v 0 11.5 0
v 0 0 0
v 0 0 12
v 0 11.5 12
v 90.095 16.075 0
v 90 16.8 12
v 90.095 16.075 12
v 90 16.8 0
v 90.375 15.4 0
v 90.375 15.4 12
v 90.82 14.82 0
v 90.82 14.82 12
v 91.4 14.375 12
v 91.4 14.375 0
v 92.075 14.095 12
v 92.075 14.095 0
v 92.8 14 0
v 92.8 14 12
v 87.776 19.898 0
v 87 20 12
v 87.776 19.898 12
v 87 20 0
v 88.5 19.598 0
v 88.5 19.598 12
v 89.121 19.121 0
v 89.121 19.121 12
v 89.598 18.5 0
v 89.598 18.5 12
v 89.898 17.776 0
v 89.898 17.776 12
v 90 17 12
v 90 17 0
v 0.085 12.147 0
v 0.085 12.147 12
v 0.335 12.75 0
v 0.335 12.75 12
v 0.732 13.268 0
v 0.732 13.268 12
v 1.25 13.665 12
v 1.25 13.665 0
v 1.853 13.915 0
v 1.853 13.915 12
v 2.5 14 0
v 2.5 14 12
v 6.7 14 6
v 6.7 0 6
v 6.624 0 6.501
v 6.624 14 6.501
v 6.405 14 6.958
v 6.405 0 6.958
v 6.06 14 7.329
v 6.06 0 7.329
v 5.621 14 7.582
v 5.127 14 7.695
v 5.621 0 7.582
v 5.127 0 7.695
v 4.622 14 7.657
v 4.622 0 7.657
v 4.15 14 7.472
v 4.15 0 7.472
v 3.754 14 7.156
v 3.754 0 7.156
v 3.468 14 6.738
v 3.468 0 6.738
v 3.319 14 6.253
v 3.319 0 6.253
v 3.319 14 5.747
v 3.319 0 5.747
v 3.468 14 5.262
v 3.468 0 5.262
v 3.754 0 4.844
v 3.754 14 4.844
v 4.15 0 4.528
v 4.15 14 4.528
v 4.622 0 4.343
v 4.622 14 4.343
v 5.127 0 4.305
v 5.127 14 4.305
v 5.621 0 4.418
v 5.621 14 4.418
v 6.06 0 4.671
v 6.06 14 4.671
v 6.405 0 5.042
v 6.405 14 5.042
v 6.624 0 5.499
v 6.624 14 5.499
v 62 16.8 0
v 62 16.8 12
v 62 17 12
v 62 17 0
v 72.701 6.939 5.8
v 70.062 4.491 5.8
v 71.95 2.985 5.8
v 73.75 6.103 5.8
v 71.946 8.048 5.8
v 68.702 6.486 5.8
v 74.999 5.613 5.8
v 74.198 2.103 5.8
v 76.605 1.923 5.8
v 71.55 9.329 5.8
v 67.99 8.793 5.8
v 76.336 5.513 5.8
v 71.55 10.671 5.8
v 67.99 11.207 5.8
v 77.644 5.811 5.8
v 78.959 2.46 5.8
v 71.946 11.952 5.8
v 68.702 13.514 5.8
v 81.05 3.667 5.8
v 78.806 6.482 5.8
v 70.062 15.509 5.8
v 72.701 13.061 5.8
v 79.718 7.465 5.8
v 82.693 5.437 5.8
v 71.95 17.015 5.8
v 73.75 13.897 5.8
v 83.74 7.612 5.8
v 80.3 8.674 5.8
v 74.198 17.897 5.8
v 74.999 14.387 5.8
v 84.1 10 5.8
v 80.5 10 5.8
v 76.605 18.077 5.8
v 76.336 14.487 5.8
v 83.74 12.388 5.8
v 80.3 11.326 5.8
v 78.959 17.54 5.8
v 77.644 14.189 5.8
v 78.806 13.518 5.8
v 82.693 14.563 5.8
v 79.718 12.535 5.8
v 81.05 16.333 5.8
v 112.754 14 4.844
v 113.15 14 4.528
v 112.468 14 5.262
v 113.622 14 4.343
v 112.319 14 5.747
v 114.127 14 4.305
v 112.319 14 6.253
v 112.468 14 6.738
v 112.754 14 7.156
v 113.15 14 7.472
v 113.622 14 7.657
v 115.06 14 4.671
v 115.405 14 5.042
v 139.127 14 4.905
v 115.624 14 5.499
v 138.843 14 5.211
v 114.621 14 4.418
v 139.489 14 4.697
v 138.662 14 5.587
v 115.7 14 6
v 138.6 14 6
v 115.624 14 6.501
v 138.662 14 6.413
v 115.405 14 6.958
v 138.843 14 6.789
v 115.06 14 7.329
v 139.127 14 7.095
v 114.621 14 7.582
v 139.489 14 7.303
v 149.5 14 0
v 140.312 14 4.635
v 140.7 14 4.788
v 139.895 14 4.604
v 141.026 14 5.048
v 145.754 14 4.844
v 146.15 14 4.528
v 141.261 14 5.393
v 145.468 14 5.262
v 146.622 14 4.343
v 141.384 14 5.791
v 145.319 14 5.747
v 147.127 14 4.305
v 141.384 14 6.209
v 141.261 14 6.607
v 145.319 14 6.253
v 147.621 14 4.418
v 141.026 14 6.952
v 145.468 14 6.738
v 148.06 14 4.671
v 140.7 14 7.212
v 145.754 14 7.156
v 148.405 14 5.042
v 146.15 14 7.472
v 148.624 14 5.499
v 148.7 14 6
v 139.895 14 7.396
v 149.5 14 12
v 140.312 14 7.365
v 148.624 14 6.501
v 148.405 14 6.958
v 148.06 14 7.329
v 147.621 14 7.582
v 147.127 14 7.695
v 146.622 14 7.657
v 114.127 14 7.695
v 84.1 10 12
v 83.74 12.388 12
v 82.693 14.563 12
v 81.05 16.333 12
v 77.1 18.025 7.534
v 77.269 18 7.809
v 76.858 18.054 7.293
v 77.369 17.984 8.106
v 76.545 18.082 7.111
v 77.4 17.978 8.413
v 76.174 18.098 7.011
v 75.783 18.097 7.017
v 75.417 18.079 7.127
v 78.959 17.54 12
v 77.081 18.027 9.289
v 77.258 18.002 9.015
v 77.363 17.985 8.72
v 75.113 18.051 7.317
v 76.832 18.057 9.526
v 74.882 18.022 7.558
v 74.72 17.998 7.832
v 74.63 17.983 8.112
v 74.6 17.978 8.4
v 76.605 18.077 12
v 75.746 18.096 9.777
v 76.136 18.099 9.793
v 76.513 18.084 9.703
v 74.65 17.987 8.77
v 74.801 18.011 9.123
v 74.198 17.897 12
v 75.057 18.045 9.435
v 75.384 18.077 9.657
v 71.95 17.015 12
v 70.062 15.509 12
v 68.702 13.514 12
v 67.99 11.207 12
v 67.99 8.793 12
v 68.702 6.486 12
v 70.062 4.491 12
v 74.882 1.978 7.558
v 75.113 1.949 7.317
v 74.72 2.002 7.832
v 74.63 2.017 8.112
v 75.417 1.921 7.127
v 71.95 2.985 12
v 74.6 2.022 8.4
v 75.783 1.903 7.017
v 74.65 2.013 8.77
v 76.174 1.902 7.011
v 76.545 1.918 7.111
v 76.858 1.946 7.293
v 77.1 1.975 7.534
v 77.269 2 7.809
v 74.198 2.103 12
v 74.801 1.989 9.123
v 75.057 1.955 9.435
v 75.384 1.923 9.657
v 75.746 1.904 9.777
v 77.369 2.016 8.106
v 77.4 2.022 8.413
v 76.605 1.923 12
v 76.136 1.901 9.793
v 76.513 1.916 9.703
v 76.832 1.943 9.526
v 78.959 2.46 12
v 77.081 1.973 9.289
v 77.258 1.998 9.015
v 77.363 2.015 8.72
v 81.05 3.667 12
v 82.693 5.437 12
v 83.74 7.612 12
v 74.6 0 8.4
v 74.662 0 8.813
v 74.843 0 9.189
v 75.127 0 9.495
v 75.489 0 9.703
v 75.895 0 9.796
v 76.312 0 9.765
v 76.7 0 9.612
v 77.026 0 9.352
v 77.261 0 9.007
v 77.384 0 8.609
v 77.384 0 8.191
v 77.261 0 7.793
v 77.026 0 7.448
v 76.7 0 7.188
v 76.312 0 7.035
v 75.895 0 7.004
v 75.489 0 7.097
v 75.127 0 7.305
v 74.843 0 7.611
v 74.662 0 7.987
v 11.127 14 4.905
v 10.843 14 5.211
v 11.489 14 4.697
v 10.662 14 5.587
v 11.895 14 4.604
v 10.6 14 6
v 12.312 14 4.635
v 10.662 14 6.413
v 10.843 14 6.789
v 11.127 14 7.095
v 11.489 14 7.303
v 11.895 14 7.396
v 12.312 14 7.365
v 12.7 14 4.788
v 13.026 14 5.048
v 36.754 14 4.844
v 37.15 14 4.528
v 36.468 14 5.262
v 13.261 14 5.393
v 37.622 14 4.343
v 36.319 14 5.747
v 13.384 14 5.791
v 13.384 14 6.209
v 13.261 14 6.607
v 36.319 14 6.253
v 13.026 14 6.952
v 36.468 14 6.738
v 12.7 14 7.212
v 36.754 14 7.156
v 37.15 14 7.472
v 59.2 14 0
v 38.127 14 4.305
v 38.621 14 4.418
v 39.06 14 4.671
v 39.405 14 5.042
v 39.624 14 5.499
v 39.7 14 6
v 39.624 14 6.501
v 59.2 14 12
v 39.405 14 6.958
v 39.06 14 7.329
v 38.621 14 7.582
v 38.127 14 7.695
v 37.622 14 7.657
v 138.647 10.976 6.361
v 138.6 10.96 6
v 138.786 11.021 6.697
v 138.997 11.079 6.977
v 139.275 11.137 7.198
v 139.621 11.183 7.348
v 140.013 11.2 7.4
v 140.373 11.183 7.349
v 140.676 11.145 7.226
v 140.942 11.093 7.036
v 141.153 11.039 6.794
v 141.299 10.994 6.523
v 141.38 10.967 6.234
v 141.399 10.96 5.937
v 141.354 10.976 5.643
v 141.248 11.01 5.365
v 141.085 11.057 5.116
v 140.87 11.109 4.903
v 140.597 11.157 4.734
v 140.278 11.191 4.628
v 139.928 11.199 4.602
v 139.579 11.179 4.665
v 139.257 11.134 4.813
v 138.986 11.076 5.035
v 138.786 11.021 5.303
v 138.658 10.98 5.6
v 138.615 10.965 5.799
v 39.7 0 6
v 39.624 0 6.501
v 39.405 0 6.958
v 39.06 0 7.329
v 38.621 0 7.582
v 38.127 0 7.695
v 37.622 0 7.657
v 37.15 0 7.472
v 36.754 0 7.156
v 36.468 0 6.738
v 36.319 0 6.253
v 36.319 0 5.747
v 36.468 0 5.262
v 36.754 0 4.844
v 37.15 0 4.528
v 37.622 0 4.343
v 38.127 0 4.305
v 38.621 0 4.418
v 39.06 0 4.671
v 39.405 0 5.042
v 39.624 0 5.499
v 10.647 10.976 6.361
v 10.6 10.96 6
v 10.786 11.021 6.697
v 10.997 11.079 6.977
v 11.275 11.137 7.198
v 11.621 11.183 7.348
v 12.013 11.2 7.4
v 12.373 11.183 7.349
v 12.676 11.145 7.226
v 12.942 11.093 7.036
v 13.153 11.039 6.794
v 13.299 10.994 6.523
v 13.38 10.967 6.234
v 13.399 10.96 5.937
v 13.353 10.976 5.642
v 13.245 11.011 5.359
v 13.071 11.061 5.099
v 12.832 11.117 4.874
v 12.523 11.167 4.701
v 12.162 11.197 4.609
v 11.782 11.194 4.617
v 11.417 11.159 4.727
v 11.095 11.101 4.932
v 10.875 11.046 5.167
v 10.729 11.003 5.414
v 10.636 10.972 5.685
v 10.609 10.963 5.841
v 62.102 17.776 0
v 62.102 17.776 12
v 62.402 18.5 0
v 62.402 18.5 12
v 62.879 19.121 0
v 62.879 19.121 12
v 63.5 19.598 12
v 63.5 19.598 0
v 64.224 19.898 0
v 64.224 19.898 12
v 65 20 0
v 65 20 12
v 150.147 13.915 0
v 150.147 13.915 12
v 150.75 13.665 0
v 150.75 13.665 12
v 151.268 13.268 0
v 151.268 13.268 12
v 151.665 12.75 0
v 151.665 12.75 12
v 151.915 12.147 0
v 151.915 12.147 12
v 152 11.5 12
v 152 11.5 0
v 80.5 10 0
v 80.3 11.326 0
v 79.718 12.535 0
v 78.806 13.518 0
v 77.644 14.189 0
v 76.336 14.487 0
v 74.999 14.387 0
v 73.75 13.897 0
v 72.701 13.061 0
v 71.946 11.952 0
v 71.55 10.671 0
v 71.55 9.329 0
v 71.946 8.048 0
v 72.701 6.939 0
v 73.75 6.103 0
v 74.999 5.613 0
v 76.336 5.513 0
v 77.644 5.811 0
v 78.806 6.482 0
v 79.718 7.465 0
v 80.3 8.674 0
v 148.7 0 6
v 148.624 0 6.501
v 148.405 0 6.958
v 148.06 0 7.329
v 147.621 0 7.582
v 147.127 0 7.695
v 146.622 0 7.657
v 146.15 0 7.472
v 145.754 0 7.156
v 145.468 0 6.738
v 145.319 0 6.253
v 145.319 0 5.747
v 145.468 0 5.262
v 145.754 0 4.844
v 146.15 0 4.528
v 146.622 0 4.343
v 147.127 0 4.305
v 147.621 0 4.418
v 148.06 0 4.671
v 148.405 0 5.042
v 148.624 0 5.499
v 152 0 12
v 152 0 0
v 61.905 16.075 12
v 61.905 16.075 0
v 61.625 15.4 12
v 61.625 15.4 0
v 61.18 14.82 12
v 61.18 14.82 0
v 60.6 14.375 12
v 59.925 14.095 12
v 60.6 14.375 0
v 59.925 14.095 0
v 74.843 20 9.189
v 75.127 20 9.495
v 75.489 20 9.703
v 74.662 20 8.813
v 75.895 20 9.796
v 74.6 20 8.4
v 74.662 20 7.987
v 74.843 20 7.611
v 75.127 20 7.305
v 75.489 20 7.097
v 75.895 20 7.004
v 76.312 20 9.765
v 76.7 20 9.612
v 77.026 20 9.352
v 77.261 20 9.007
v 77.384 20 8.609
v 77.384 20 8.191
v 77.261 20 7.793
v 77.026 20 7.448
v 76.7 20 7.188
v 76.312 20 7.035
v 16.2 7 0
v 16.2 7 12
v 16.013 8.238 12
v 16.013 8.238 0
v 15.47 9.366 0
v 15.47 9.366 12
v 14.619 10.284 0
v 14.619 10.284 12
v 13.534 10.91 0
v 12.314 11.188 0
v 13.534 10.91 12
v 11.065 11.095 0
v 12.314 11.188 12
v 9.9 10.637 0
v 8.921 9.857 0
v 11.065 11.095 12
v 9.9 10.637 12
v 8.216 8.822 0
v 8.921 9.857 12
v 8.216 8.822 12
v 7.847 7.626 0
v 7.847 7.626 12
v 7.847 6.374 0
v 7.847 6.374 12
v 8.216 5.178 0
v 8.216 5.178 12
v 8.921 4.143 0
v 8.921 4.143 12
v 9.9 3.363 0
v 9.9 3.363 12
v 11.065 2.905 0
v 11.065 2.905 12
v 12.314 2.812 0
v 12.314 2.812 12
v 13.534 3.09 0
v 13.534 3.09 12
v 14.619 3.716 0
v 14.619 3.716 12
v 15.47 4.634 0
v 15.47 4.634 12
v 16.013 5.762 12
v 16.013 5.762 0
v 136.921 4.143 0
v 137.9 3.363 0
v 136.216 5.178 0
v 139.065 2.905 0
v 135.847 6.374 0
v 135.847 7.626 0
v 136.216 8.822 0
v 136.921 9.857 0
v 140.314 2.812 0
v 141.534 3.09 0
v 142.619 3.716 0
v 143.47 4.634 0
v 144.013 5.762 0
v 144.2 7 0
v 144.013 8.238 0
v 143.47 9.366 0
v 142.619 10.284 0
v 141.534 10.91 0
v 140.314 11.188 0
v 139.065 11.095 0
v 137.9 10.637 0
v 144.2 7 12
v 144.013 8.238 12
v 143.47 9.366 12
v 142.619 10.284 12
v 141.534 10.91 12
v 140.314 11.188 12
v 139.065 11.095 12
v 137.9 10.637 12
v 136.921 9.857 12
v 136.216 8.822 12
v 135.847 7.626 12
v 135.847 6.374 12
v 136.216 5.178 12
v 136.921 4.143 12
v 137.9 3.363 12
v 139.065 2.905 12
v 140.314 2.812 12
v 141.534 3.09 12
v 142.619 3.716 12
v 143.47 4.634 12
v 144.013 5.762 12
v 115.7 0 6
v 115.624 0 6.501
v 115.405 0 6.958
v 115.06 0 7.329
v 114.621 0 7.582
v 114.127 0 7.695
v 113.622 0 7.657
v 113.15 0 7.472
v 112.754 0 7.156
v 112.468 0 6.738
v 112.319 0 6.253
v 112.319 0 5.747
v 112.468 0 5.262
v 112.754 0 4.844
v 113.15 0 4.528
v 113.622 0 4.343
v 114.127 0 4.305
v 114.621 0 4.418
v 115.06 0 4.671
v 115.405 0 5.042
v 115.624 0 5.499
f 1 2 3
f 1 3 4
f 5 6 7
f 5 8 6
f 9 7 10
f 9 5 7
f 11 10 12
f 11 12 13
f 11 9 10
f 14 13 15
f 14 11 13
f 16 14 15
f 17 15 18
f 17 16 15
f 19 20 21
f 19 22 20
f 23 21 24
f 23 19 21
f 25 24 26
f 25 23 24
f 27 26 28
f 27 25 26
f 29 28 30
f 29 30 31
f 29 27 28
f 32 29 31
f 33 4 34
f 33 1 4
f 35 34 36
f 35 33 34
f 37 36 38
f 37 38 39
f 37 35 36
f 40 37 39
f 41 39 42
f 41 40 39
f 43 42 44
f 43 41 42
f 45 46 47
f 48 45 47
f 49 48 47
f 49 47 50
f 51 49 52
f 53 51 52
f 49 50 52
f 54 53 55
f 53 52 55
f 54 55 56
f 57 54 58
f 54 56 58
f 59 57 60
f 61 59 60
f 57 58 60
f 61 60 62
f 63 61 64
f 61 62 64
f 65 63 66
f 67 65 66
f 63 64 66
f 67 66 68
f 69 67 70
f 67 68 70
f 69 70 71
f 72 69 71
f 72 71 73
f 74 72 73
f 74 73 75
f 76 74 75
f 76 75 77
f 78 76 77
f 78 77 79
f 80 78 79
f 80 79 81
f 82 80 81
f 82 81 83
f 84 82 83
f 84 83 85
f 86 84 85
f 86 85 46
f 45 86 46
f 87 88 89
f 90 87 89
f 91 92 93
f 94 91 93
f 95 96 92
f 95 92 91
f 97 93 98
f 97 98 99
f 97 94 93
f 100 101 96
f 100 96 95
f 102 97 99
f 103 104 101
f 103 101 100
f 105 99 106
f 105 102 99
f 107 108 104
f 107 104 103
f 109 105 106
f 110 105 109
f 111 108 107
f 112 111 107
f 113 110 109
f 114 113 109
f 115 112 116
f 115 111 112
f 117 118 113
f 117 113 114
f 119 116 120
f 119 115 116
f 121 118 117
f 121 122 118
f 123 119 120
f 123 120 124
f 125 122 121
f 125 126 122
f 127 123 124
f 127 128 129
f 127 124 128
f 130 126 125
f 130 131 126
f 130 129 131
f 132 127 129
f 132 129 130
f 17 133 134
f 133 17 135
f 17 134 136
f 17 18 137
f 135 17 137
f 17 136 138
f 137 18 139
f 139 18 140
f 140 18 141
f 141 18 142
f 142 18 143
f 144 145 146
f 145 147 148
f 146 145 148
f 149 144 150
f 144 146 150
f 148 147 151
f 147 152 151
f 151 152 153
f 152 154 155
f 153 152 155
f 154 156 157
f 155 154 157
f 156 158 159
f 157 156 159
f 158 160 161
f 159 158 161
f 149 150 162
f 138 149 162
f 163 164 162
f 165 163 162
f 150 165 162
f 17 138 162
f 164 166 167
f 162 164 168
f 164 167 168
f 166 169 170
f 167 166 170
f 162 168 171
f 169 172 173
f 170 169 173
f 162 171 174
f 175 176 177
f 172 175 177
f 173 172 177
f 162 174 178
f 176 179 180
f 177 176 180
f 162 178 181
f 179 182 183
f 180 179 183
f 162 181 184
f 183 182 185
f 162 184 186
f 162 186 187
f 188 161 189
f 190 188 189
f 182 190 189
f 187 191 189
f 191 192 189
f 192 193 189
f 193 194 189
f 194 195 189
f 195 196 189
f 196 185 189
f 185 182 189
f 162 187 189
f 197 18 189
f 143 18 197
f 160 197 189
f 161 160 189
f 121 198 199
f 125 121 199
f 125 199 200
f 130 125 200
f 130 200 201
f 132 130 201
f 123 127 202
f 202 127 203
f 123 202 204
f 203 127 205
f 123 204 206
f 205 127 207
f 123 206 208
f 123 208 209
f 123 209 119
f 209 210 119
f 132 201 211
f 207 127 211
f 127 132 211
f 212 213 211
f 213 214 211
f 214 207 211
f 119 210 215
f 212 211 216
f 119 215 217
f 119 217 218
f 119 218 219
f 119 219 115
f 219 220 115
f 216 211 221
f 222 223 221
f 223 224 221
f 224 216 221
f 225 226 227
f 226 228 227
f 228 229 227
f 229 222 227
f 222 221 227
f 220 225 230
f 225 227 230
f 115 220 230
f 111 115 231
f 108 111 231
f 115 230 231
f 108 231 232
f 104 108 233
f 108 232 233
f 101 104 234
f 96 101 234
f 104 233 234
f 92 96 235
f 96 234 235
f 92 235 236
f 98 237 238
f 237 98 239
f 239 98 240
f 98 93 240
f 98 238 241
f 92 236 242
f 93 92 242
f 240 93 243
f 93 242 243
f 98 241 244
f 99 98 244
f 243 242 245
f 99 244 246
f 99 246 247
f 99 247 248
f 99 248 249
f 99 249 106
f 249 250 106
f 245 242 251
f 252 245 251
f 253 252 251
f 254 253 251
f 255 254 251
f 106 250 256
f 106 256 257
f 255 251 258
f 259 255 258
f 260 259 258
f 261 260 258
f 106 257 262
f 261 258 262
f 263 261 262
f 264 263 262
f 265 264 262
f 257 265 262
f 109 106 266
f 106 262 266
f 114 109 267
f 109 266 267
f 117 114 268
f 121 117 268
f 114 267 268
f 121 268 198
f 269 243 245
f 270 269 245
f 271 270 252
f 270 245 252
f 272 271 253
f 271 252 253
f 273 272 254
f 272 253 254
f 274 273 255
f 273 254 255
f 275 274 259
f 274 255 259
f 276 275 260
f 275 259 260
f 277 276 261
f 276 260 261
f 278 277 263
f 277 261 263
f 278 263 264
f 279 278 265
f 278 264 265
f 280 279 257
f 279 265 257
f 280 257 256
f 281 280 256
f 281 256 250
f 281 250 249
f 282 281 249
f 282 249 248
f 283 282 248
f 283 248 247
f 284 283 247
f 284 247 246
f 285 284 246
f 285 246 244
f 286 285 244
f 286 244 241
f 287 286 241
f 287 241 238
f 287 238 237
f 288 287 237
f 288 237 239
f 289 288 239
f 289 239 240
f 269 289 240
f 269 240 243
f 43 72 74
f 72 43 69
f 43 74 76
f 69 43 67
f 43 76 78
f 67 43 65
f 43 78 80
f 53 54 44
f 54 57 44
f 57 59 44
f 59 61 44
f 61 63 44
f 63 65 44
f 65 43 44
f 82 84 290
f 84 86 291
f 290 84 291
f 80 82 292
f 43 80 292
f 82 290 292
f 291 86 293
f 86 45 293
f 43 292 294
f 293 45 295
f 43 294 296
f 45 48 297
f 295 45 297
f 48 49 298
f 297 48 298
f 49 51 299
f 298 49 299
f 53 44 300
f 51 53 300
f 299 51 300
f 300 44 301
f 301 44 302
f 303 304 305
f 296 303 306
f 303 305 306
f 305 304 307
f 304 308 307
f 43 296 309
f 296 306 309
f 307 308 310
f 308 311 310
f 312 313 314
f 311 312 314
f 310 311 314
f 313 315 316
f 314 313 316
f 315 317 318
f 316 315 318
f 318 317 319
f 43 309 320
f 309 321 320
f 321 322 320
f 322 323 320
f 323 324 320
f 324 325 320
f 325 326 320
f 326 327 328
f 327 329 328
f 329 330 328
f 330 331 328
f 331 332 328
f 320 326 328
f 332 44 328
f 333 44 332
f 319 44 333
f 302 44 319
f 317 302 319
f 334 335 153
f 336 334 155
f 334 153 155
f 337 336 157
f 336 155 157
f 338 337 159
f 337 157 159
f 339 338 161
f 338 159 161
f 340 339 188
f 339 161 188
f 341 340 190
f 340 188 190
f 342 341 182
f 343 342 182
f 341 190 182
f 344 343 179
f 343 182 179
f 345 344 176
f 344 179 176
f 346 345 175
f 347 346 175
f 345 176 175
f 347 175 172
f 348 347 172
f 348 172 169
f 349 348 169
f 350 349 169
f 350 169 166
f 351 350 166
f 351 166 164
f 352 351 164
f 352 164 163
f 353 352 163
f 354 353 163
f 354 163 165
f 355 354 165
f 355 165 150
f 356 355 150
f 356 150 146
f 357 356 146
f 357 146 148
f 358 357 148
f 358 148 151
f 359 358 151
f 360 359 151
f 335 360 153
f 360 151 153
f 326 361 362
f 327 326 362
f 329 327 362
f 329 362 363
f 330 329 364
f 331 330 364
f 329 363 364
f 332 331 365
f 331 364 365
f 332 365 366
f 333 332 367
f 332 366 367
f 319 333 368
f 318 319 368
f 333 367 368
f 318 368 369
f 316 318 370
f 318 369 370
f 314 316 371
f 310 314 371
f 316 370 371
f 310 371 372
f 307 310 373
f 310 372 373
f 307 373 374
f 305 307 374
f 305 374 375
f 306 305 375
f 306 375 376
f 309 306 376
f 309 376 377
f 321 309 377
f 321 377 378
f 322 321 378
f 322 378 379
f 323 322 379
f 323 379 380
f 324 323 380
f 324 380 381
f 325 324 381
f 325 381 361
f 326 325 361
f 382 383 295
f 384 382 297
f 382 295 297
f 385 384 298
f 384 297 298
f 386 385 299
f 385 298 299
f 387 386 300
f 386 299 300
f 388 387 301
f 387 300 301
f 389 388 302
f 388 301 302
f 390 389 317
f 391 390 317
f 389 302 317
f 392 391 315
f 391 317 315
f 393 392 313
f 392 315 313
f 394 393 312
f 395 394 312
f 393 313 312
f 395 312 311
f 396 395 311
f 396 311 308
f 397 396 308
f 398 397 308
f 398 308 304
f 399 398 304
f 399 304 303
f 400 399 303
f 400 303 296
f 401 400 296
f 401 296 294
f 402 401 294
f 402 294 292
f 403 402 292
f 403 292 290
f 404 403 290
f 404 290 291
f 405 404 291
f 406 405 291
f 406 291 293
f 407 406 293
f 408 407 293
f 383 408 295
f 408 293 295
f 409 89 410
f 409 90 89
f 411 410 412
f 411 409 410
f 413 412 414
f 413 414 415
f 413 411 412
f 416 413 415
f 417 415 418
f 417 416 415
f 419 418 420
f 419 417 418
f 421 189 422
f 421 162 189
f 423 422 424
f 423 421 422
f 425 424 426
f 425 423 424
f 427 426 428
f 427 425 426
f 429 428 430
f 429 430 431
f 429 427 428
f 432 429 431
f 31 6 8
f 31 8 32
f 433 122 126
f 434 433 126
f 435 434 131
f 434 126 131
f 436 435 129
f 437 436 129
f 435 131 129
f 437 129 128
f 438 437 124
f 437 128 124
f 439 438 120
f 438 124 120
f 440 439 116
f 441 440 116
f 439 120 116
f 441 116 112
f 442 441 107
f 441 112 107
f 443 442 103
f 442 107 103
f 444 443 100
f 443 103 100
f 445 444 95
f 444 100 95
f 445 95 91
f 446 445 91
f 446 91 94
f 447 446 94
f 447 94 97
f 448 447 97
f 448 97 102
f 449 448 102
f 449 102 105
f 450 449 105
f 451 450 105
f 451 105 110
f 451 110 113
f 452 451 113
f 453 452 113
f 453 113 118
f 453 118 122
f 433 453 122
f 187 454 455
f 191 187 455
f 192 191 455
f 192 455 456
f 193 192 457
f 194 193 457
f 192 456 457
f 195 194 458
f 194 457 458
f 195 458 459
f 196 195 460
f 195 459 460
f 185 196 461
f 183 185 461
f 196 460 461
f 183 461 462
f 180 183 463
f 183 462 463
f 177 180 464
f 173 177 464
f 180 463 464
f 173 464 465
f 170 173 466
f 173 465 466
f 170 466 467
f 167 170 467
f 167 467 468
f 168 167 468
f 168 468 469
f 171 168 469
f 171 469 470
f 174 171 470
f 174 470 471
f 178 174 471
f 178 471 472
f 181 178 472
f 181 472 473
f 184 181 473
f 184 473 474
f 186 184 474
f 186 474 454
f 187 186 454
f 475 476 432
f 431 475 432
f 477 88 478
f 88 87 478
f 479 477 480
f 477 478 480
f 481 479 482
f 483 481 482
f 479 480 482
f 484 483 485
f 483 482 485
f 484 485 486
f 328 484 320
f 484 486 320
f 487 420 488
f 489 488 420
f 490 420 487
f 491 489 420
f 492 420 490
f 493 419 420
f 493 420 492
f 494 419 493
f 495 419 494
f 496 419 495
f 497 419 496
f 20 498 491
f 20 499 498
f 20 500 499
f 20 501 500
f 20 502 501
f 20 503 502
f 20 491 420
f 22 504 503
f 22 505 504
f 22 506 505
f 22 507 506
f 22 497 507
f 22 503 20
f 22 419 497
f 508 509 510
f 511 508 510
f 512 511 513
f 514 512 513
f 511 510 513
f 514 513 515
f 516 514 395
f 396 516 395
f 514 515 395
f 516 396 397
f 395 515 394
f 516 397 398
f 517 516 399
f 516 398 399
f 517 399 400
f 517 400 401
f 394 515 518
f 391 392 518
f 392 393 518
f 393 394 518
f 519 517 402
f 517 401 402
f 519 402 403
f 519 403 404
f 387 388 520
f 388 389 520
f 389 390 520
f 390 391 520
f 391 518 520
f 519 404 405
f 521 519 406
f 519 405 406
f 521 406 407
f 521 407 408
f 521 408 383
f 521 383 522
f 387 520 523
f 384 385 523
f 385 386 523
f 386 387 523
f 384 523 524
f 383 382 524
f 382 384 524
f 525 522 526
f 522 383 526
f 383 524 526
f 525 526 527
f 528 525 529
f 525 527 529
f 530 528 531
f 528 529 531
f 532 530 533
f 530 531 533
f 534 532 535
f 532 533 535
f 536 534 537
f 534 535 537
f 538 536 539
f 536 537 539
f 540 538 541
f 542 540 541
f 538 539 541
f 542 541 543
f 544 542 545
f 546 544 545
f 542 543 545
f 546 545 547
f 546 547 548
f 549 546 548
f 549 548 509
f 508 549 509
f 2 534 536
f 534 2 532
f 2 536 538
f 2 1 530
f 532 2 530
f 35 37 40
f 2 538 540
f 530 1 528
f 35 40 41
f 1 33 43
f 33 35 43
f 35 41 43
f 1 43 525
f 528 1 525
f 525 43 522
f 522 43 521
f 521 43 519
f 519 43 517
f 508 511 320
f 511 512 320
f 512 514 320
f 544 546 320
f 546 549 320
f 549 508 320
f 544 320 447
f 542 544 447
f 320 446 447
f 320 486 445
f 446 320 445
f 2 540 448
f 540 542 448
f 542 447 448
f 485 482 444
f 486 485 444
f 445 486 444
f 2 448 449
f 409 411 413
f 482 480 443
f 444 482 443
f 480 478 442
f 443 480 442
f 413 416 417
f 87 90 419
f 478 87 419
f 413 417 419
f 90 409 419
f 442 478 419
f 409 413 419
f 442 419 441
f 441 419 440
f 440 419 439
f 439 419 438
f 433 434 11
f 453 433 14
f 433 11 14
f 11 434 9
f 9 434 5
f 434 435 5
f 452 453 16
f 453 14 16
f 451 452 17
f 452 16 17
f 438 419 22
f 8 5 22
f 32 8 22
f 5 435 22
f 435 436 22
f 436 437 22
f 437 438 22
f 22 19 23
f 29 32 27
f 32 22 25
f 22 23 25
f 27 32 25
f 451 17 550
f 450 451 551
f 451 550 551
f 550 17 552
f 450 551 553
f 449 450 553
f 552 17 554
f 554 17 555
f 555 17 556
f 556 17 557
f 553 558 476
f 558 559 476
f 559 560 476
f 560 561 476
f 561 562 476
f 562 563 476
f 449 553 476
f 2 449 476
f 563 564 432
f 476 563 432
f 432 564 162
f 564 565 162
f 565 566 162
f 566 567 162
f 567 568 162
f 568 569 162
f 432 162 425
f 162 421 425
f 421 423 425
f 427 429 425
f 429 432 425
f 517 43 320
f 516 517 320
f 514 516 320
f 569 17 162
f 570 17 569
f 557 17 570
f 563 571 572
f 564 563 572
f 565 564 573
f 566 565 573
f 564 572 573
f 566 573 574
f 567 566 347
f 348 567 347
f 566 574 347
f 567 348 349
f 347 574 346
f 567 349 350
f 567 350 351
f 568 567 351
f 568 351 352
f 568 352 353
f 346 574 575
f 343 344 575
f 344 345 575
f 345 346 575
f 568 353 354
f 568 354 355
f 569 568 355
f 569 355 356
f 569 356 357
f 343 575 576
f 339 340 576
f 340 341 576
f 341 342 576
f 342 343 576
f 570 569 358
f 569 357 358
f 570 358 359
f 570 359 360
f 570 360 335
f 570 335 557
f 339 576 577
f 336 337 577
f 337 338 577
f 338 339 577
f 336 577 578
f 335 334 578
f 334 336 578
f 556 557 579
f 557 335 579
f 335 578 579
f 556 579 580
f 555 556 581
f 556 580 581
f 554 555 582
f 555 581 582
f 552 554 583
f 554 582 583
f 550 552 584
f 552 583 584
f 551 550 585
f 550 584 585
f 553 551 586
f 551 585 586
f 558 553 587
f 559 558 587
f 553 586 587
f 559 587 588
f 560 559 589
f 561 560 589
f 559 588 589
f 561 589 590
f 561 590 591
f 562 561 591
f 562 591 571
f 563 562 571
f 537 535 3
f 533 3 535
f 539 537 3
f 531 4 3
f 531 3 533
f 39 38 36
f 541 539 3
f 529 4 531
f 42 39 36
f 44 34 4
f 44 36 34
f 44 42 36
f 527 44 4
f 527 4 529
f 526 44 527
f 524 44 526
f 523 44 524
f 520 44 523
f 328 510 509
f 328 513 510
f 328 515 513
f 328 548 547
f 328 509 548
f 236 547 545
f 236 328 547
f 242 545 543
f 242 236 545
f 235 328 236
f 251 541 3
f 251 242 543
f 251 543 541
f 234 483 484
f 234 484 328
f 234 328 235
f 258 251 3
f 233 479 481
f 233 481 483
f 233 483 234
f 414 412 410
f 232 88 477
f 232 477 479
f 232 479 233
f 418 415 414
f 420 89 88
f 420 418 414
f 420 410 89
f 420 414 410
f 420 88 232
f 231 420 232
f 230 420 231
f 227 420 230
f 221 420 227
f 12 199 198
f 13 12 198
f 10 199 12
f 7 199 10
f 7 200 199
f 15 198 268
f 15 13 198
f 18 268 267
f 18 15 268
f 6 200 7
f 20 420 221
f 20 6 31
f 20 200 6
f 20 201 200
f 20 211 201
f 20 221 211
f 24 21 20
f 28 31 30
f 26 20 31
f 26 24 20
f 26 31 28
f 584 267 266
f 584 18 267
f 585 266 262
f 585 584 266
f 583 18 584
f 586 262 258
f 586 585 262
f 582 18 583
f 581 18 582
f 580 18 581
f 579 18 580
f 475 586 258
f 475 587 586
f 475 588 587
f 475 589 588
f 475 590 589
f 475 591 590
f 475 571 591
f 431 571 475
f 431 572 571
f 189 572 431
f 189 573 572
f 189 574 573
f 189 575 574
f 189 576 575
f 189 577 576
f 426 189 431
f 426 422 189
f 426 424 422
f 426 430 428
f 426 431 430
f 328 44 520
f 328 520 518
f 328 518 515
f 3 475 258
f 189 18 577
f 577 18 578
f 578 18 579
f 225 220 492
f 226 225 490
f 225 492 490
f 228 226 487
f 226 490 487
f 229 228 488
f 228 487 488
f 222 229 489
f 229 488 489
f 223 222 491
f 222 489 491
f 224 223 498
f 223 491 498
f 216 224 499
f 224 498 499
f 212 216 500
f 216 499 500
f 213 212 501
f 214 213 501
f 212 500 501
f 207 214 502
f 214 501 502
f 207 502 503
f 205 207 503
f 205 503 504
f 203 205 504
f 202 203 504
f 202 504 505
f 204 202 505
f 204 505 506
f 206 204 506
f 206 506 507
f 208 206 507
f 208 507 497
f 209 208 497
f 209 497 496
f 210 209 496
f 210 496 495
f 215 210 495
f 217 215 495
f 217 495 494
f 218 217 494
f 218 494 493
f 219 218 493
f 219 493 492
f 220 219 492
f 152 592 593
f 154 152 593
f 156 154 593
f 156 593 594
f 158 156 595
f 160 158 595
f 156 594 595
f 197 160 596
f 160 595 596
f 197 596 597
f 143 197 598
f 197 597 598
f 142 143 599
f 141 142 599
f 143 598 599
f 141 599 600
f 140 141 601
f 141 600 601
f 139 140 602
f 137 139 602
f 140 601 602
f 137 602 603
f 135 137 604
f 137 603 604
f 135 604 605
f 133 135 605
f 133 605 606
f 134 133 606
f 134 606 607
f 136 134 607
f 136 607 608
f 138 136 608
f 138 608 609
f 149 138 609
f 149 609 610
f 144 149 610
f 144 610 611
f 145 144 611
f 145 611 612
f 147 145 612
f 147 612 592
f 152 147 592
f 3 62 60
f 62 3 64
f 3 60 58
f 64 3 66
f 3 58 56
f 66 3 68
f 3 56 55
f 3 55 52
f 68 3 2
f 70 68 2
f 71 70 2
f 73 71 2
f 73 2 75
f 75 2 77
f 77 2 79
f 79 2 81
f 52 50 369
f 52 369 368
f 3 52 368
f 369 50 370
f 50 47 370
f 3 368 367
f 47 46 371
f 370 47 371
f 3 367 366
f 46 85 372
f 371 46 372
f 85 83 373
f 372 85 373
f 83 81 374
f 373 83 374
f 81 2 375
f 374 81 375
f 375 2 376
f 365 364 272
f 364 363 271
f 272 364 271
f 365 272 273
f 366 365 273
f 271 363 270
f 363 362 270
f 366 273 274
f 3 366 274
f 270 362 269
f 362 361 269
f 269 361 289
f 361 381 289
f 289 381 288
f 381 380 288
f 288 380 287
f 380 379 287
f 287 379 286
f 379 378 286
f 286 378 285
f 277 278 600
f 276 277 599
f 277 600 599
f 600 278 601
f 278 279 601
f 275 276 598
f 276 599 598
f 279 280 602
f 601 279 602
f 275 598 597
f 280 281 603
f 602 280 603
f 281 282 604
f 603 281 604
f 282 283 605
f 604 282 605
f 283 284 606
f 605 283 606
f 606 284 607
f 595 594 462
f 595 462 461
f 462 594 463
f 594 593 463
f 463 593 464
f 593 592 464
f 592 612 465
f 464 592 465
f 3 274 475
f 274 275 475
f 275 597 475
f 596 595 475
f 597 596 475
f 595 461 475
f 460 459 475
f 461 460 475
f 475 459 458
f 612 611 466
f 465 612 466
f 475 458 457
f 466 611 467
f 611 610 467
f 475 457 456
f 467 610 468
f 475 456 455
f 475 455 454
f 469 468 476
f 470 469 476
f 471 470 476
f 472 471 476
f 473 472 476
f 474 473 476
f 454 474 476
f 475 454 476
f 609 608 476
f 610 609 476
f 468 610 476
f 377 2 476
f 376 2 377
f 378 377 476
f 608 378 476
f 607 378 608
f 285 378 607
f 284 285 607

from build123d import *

# Parameters (mm, degrees)
BOX_W           = 152
BOX_H           = 20
BOX_DEPTH       = 12
SKETCH_R        = 1.7
POCKET_DEPTH    = 20.001
SKETCH001_R     = 4.2
SKETCH001_R_2   = 4.5
SKETCH001_W     = 62
SKETCH001_H     = 8
SKETCH001_H_2   = 9.357648
POCKET001_DEPTH = 12.001
SKETCH002_R     = 8.1
POCKET002_DEPTH = 6.2
SKETCH004_R     = 1.4
POCKET003_DEPTH = 5
SKETCH005_R     = 1.4
POCKET004_DEPTH = 5
SKETCH003_R     = 1.4
POCKET005_DEPTH = 20.001
FILLET_R        = 2.5
FILLET001_R     = 3
FILLET002_R     = 2.8


with BuildPart() as part:
    # Box → Box (new body)
    with BuildSketch(Plane.XY):
        with Locations((76, 10)):
            Rectangle(BOX_W, BOX_H)
    extrude(amount=BOX_DEPTH)

    # Sketch → Pocket (cut, through all)
    with BuildSketch(Plane.XZ):
        with Locations((5, 6)):
            Circle(SKETCH_R)
        with Locations((38, 6)):
            Circle(SKETCH_R)
        with Locations((114, 6)):
            Circle(SKETCH_R)
        with Locations((147, 6)):
            Circle(SKETCH_R)
    extrude(amount=-POCKET_DEPTH, mode=Mode.SUBTRACT)

    # Sketch001 → Pocket001 (cut, through all)
    with BuildSketch(Plane.XY.offset(12)):
        with Locations((12, 7)):
            Circle(SKETCH001_R)
        with Locations((140, 7)):
            Circle(SKETCH001_R)
        with Locations((76, 10)):
            Circle(SKETCH001_R_2)
        with Locations((31, 18)):
            Rectangle(SKETCH001_W, SKETCH001_H)
        with Locations((121, 18.678824)):
            Rectangle(SKETCH001_W, SKETCH001_H_2)
    extrude(amount=-POCKET001_DEPTH, mode=Mode.SUBTRACT)

    # Sketch002 → Pocket002 (cut)
    with BuildSketch(Plane.XY.offset(12)):
        with Locations((76, 10)):
            Circle(SKETCH002_R)
    extrude(amount=-POCKET002_DEPTH, mode=Mode.SUBTRACT)

    # Sketch004 → Pocket003 (cut)
    with BuildSketch(Plane(origin=(0, 14, 0), x_dir=(-1, 0, 0), z_dir=(0, 1, 0))):
        with Locations((-12, 6)):
            Circle(SKETCH004_R)
    extrude(amount=-POCKET003_DEPTH, mode=Mode.SUBTRACT)

    # Sketch005 → Pocket004 (cut)
    with BuildSketch(Plane(origin=(0, 14, 0), x_dir=(-1, 0, 0), z_dir=(0, 1, 0))):
        with Locations((-140, 6)):
            Circle(SKETCH005_R)
    extrude(amount=-POCKET004_DEPTH, mode=Mode.SUBTRACT)

    # Sketch003 → Pocket005 (cut, through all)
    with BuildSketch(Plane(origin=(0, 20, 0), x_dir=(-1, 0, 0), z_dir=(0, 1, 0))):
        with Locations((-76, 8.4)):
            Circle(SKETCH003_R)
    extrude(amount=-POCKET005_DEPTH, mode=Mode.SUBTRACT)

    # Fillet
    fillet_edges = [part.edges().sort_by_distance(p)[0] for p in [
        (152, 14, 6),
        (0, 14, 6),
    ]]
    fillet(fillet_edges, radius=FILLET_R)

    # Fillet001
    fillet001_edges = [part.edges().sort_by_distance(p)[0] for p in [
        (90, 20, 6),
        (62, 20, 6),
    ]]
    fillet(fillet001_edges, radius=FILLET001_R)

    # Fillet002
    fillet002_edges = [part.edges().sort_by_distance(p)[0] for p in [
        (62, 14, 6),
        (90, 14, 6),
    ]]
    fillet(fillet002_edges, radius=FILLET002_R)


solid = part.part
